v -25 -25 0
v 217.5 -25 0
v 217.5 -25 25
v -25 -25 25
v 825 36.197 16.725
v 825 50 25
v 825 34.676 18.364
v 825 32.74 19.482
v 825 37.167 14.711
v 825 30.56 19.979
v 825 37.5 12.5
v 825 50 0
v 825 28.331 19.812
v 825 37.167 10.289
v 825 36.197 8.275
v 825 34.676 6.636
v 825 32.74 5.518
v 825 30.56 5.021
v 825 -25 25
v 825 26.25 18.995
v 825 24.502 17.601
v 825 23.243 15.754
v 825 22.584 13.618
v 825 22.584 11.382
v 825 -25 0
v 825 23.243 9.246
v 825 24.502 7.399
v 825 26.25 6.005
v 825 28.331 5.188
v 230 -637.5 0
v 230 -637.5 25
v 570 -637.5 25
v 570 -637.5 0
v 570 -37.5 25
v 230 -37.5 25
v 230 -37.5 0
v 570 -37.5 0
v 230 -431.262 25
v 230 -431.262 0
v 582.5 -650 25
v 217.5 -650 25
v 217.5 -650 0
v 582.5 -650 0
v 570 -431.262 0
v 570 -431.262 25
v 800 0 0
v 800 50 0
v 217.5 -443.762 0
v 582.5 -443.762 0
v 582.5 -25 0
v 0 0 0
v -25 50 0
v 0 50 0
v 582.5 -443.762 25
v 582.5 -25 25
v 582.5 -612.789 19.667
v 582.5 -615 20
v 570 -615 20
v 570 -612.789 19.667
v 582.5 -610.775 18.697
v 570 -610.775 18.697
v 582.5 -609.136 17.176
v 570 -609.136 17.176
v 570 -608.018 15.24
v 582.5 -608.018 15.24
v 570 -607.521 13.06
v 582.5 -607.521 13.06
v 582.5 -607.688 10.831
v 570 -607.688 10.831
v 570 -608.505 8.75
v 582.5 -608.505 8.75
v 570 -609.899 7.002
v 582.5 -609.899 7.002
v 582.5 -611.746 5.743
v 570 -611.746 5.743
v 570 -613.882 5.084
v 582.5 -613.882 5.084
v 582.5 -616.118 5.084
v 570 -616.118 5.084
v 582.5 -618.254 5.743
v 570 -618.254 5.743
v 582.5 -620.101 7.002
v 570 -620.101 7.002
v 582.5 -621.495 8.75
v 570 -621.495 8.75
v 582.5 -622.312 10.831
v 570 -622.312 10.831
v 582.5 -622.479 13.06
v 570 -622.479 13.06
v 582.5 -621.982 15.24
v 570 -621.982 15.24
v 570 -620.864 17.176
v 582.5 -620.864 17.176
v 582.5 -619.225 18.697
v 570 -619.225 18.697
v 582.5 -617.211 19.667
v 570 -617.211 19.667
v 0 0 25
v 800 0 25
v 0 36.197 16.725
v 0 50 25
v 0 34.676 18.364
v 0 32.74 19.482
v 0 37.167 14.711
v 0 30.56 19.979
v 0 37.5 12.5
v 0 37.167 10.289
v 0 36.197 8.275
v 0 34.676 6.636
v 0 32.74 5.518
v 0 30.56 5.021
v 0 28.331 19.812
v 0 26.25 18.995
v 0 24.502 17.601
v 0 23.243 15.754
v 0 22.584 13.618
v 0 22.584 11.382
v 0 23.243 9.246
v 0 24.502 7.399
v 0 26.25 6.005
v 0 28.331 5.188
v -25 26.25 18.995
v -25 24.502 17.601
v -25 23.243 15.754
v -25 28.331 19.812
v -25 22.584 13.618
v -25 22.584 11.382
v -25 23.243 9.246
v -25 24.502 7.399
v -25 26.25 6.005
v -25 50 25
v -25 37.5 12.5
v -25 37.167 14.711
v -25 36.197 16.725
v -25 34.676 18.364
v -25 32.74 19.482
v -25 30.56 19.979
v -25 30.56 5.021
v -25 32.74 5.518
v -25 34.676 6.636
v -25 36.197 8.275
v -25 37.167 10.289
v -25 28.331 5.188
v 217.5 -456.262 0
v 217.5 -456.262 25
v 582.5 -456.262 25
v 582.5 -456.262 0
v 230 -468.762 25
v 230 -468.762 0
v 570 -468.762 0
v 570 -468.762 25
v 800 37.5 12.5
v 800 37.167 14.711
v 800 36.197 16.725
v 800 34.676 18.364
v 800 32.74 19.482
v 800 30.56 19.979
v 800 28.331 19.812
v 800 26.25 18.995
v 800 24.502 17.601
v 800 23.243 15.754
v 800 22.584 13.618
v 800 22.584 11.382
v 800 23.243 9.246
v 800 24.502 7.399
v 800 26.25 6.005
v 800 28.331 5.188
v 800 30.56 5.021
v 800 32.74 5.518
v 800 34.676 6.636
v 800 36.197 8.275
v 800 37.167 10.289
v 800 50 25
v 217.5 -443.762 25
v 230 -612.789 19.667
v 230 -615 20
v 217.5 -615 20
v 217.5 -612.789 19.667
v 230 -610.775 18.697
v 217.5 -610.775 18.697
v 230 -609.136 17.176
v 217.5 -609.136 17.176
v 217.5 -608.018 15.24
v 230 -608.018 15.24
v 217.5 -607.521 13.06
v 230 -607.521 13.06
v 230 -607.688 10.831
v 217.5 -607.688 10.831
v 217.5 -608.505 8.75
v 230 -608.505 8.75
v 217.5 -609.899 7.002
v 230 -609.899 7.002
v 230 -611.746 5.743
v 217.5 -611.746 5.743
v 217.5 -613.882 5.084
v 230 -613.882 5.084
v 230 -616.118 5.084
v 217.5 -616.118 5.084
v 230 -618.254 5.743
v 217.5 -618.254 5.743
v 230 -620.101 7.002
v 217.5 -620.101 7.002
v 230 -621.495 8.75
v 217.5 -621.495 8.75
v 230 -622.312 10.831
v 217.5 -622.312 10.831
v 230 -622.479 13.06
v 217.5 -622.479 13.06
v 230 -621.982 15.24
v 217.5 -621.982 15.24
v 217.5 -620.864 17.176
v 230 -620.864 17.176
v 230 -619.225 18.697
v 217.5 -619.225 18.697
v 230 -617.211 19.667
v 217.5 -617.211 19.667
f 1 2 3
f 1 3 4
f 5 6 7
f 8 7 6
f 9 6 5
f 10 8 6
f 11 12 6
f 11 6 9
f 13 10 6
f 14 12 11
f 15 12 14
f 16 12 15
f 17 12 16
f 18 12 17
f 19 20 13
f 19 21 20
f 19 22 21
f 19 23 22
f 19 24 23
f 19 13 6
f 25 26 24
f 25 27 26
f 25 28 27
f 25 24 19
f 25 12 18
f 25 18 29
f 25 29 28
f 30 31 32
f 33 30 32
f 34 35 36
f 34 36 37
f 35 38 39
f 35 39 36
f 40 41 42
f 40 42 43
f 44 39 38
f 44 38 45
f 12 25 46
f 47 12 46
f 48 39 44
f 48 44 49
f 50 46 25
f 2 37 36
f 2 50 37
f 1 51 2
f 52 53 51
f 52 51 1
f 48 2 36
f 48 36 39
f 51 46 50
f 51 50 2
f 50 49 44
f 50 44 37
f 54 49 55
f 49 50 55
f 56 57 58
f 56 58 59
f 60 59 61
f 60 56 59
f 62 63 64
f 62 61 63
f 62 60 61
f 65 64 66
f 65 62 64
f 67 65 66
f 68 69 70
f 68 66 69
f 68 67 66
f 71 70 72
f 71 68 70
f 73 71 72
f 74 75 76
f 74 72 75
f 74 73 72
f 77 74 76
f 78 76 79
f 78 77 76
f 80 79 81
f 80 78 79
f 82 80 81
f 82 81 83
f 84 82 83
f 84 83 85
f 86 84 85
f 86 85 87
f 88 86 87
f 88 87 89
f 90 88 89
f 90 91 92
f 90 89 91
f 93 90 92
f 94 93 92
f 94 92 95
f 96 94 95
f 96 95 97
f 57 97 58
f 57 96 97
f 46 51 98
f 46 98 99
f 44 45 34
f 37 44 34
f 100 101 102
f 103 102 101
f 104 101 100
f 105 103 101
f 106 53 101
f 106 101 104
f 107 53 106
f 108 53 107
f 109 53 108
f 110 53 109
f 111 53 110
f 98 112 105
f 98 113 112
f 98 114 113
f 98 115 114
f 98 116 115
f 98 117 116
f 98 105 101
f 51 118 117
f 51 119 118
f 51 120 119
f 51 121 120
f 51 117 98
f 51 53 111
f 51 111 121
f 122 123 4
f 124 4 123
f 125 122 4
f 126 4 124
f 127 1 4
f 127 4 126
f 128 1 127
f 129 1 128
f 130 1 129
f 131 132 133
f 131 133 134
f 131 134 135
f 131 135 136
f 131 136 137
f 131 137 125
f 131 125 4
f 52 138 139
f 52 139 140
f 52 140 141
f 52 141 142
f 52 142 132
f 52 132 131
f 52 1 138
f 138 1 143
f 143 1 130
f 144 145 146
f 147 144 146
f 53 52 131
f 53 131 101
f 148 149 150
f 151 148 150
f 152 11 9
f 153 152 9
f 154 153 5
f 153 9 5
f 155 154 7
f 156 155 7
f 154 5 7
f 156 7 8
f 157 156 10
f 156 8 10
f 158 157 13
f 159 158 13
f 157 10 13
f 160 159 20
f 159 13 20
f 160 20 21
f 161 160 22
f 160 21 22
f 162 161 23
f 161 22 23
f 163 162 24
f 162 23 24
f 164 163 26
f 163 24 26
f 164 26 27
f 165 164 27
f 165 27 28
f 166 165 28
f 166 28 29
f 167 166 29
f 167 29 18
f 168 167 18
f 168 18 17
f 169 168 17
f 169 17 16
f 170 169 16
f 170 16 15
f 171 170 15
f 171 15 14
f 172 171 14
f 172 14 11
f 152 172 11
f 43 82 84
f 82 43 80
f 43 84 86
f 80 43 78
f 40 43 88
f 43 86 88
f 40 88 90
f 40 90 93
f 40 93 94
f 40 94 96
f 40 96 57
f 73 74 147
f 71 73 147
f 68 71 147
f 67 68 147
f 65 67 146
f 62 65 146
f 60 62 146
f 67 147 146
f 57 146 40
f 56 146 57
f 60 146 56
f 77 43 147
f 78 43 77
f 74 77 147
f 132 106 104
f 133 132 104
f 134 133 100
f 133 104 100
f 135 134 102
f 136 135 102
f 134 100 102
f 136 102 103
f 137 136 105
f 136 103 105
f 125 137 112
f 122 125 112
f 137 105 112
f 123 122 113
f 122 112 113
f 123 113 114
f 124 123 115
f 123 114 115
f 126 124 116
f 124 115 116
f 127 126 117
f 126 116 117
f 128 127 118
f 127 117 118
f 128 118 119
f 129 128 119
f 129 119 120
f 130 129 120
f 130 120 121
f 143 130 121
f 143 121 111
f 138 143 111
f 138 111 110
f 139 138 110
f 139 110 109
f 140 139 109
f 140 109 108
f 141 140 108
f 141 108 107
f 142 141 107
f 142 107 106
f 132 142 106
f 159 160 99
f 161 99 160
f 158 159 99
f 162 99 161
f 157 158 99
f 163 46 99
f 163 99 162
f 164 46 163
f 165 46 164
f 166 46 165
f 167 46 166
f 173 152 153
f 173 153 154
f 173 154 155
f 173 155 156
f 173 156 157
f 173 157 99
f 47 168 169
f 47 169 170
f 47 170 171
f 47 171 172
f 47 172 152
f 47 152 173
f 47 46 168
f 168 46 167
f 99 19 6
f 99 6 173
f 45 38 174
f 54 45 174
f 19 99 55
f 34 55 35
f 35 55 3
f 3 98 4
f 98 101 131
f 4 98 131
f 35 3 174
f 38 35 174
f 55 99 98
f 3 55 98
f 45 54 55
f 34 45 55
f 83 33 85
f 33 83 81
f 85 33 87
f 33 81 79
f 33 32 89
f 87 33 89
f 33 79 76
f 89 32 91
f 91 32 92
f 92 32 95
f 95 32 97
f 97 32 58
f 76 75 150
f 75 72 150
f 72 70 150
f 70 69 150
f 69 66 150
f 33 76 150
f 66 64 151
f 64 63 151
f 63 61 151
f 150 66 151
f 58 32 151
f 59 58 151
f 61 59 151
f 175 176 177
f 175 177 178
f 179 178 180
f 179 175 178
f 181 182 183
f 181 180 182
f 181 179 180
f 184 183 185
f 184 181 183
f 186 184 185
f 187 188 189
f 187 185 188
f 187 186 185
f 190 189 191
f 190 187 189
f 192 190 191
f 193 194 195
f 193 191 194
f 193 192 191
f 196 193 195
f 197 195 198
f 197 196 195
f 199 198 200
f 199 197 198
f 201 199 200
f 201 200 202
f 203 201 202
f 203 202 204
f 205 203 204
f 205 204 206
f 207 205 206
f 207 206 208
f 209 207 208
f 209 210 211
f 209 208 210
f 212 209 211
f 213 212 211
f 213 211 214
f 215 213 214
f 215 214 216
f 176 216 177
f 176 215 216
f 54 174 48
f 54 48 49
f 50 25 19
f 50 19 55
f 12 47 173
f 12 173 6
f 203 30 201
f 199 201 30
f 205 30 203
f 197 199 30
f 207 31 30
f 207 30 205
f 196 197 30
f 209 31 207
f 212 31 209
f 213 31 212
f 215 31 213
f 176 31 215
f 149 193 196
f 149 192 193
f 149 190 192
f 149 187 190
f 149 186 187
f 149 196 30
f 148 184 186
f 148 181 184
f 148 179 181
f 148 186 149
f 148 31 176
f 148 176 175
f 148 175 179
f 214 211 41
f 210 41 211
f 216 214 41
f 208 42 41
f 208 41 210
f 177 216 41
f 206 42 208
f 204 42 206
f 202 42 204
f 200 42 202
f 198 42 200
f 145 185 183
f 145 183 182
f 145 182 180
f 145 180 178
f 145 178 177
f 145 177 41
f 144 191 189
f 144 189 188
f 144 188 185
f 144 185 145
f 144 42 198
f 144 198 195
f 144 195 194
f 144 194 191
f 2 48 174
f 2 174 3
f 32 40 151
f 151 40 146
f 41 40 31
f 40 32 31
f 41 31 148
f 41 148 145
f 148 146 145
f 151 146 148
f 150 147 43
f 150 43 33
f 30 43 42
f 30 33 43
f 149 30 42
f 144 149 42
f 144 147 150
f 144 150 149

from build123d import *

# Parameters (mm, degrees)
BOSS_EXTRUDE1_DEPTH     = 25
SKETCH2_R               = 7.5
CUT_EXTRUDE1_DEPTH      = 10000
SKETCH3_W               = 365
SKETCH3_H               = 25
BOSS_EXTRUDE3_DEPTH     = 625
SKETCH4_W               = 340
SKETCH4_H               = 600
CUT_EXTRUDE2_DEPTH      = 625
SKETCH5_W               = 365
SKETCH5_H               = 37.5
BOSS_EXTRUDE4_DEPTH     = 25
SKETCH6_W               = 406.123907145
SKETCH6_H               = 12.5
CUT_EXTRUDE3_DEPTH      = 25
CUT_EXTRUDE4_DEPTH      = 891.045644897
CUT_EXTRUDE4_DEPTH_BACK = 891.045644897
SKETCH7_R               = 7.5


with BuildPart() as part:
    # Sketch1 → Boss-Extrude1 (new body)
    with BuildSketch(Plane.XY):
        Polygon((0, 0), (800, 0), (800, 50), (825, 50), (825, -25), (-25, -25), (-25, 50), (0, 50), align=None)
    extrude(amount=BOSS_EXTRUDE1_DEPTH)

    # Sketch2 → Cut-Extrude1 (cut)
    with BuildSketch(Plane(origin=(825, 0, 0), x_dir=(0, 0, -1), z_dir=(1, 0, 0))):
        with Locations(Location((-12.5, 30, 0), (0, 0, 90))):
            Circle(SKETCH2_R)
    extrude(amount=-CUT_EXTRUDE1_DEPTH, mode=Mode.SUBTRACT)

    # Sketch3 → Boss-Extrude3 (add)
    with BuildSketch(Plane.XZ.offset(25)):
        with Locations((400, 12.5)):
            Rectangle(SKETCH3_W, SKETCH3_H)
    extrude(amount=BOSS_EXTRUDE3_DEPTH)

    # Sketch4 → Cut-Extrude2 (cut)
    with BuildSketch(Plane.XY.offset(25)):
        with Locations((400, -337.5)):
            Rectangle(SKETCH4_W, SKETCH4_H)
    extrude(amount=-CUT_EXTRUDE2_DEPTH, mode=Mode.SUBTRACT)

    # Sketch5 → Boss-Extrude4 (add)
    with BuildSketch(Plane.XY):
        with Locations((400, -450.012397123)):
            Rectangle(SKETCH5_W, SKETCH5_H)
    extrude(amount=BOSS_EXTRUDE4_DEPTH)

    # Sketch6 → Cut-Extrude3 (cut)
    with BuildSketch(Plane.XY.offset(25)):
        with Locations((400.088829204, -450.012397123)):
            Rectangle(SKETCH6_W, SKETCH6_H)
    extrude(amount=-CUT_EXTRUDE3_DEPTH, mode=Mode.SUBTRACT)


with BuildPart() as cut_extrude3_piece_1:
    # of the separate pieces the step leaves, piece 1, a body of its own (cut_extrude3_pieces)
    add(part.part.solids().sort_by_distance((0, 0, 0))[0])


with BuildPart() as cut_extrude3_piece_2:
    # of the separate pieces the step leaves, piece 2, a body of its own (cut_extrude3_pieces)
    add(part.part.solids().sort_by_distance((217.5, -650, 0))[0])

    # Sketch7 → Cut-Extrude4 (cut, two sides: drawn at the far end of the back side and taken through both)
    with BuildSketch(Plane.ZY.offset(-217.5).offset(-CUT_EXTRUDE4_DEPTH_BACK)):
        with Locations((12.5, -615)):
            Circle(SKETCH7_R)
    extrude(amount=CUT_EXTRUDE4_DEPTH + CUT_EXTRUDE4_DEPTH_BACK, mode=Mode.SUBTRACT)


solid = Compound([cut_extrude3_piece_1.part, cut_extrude3_piece_2.part])
